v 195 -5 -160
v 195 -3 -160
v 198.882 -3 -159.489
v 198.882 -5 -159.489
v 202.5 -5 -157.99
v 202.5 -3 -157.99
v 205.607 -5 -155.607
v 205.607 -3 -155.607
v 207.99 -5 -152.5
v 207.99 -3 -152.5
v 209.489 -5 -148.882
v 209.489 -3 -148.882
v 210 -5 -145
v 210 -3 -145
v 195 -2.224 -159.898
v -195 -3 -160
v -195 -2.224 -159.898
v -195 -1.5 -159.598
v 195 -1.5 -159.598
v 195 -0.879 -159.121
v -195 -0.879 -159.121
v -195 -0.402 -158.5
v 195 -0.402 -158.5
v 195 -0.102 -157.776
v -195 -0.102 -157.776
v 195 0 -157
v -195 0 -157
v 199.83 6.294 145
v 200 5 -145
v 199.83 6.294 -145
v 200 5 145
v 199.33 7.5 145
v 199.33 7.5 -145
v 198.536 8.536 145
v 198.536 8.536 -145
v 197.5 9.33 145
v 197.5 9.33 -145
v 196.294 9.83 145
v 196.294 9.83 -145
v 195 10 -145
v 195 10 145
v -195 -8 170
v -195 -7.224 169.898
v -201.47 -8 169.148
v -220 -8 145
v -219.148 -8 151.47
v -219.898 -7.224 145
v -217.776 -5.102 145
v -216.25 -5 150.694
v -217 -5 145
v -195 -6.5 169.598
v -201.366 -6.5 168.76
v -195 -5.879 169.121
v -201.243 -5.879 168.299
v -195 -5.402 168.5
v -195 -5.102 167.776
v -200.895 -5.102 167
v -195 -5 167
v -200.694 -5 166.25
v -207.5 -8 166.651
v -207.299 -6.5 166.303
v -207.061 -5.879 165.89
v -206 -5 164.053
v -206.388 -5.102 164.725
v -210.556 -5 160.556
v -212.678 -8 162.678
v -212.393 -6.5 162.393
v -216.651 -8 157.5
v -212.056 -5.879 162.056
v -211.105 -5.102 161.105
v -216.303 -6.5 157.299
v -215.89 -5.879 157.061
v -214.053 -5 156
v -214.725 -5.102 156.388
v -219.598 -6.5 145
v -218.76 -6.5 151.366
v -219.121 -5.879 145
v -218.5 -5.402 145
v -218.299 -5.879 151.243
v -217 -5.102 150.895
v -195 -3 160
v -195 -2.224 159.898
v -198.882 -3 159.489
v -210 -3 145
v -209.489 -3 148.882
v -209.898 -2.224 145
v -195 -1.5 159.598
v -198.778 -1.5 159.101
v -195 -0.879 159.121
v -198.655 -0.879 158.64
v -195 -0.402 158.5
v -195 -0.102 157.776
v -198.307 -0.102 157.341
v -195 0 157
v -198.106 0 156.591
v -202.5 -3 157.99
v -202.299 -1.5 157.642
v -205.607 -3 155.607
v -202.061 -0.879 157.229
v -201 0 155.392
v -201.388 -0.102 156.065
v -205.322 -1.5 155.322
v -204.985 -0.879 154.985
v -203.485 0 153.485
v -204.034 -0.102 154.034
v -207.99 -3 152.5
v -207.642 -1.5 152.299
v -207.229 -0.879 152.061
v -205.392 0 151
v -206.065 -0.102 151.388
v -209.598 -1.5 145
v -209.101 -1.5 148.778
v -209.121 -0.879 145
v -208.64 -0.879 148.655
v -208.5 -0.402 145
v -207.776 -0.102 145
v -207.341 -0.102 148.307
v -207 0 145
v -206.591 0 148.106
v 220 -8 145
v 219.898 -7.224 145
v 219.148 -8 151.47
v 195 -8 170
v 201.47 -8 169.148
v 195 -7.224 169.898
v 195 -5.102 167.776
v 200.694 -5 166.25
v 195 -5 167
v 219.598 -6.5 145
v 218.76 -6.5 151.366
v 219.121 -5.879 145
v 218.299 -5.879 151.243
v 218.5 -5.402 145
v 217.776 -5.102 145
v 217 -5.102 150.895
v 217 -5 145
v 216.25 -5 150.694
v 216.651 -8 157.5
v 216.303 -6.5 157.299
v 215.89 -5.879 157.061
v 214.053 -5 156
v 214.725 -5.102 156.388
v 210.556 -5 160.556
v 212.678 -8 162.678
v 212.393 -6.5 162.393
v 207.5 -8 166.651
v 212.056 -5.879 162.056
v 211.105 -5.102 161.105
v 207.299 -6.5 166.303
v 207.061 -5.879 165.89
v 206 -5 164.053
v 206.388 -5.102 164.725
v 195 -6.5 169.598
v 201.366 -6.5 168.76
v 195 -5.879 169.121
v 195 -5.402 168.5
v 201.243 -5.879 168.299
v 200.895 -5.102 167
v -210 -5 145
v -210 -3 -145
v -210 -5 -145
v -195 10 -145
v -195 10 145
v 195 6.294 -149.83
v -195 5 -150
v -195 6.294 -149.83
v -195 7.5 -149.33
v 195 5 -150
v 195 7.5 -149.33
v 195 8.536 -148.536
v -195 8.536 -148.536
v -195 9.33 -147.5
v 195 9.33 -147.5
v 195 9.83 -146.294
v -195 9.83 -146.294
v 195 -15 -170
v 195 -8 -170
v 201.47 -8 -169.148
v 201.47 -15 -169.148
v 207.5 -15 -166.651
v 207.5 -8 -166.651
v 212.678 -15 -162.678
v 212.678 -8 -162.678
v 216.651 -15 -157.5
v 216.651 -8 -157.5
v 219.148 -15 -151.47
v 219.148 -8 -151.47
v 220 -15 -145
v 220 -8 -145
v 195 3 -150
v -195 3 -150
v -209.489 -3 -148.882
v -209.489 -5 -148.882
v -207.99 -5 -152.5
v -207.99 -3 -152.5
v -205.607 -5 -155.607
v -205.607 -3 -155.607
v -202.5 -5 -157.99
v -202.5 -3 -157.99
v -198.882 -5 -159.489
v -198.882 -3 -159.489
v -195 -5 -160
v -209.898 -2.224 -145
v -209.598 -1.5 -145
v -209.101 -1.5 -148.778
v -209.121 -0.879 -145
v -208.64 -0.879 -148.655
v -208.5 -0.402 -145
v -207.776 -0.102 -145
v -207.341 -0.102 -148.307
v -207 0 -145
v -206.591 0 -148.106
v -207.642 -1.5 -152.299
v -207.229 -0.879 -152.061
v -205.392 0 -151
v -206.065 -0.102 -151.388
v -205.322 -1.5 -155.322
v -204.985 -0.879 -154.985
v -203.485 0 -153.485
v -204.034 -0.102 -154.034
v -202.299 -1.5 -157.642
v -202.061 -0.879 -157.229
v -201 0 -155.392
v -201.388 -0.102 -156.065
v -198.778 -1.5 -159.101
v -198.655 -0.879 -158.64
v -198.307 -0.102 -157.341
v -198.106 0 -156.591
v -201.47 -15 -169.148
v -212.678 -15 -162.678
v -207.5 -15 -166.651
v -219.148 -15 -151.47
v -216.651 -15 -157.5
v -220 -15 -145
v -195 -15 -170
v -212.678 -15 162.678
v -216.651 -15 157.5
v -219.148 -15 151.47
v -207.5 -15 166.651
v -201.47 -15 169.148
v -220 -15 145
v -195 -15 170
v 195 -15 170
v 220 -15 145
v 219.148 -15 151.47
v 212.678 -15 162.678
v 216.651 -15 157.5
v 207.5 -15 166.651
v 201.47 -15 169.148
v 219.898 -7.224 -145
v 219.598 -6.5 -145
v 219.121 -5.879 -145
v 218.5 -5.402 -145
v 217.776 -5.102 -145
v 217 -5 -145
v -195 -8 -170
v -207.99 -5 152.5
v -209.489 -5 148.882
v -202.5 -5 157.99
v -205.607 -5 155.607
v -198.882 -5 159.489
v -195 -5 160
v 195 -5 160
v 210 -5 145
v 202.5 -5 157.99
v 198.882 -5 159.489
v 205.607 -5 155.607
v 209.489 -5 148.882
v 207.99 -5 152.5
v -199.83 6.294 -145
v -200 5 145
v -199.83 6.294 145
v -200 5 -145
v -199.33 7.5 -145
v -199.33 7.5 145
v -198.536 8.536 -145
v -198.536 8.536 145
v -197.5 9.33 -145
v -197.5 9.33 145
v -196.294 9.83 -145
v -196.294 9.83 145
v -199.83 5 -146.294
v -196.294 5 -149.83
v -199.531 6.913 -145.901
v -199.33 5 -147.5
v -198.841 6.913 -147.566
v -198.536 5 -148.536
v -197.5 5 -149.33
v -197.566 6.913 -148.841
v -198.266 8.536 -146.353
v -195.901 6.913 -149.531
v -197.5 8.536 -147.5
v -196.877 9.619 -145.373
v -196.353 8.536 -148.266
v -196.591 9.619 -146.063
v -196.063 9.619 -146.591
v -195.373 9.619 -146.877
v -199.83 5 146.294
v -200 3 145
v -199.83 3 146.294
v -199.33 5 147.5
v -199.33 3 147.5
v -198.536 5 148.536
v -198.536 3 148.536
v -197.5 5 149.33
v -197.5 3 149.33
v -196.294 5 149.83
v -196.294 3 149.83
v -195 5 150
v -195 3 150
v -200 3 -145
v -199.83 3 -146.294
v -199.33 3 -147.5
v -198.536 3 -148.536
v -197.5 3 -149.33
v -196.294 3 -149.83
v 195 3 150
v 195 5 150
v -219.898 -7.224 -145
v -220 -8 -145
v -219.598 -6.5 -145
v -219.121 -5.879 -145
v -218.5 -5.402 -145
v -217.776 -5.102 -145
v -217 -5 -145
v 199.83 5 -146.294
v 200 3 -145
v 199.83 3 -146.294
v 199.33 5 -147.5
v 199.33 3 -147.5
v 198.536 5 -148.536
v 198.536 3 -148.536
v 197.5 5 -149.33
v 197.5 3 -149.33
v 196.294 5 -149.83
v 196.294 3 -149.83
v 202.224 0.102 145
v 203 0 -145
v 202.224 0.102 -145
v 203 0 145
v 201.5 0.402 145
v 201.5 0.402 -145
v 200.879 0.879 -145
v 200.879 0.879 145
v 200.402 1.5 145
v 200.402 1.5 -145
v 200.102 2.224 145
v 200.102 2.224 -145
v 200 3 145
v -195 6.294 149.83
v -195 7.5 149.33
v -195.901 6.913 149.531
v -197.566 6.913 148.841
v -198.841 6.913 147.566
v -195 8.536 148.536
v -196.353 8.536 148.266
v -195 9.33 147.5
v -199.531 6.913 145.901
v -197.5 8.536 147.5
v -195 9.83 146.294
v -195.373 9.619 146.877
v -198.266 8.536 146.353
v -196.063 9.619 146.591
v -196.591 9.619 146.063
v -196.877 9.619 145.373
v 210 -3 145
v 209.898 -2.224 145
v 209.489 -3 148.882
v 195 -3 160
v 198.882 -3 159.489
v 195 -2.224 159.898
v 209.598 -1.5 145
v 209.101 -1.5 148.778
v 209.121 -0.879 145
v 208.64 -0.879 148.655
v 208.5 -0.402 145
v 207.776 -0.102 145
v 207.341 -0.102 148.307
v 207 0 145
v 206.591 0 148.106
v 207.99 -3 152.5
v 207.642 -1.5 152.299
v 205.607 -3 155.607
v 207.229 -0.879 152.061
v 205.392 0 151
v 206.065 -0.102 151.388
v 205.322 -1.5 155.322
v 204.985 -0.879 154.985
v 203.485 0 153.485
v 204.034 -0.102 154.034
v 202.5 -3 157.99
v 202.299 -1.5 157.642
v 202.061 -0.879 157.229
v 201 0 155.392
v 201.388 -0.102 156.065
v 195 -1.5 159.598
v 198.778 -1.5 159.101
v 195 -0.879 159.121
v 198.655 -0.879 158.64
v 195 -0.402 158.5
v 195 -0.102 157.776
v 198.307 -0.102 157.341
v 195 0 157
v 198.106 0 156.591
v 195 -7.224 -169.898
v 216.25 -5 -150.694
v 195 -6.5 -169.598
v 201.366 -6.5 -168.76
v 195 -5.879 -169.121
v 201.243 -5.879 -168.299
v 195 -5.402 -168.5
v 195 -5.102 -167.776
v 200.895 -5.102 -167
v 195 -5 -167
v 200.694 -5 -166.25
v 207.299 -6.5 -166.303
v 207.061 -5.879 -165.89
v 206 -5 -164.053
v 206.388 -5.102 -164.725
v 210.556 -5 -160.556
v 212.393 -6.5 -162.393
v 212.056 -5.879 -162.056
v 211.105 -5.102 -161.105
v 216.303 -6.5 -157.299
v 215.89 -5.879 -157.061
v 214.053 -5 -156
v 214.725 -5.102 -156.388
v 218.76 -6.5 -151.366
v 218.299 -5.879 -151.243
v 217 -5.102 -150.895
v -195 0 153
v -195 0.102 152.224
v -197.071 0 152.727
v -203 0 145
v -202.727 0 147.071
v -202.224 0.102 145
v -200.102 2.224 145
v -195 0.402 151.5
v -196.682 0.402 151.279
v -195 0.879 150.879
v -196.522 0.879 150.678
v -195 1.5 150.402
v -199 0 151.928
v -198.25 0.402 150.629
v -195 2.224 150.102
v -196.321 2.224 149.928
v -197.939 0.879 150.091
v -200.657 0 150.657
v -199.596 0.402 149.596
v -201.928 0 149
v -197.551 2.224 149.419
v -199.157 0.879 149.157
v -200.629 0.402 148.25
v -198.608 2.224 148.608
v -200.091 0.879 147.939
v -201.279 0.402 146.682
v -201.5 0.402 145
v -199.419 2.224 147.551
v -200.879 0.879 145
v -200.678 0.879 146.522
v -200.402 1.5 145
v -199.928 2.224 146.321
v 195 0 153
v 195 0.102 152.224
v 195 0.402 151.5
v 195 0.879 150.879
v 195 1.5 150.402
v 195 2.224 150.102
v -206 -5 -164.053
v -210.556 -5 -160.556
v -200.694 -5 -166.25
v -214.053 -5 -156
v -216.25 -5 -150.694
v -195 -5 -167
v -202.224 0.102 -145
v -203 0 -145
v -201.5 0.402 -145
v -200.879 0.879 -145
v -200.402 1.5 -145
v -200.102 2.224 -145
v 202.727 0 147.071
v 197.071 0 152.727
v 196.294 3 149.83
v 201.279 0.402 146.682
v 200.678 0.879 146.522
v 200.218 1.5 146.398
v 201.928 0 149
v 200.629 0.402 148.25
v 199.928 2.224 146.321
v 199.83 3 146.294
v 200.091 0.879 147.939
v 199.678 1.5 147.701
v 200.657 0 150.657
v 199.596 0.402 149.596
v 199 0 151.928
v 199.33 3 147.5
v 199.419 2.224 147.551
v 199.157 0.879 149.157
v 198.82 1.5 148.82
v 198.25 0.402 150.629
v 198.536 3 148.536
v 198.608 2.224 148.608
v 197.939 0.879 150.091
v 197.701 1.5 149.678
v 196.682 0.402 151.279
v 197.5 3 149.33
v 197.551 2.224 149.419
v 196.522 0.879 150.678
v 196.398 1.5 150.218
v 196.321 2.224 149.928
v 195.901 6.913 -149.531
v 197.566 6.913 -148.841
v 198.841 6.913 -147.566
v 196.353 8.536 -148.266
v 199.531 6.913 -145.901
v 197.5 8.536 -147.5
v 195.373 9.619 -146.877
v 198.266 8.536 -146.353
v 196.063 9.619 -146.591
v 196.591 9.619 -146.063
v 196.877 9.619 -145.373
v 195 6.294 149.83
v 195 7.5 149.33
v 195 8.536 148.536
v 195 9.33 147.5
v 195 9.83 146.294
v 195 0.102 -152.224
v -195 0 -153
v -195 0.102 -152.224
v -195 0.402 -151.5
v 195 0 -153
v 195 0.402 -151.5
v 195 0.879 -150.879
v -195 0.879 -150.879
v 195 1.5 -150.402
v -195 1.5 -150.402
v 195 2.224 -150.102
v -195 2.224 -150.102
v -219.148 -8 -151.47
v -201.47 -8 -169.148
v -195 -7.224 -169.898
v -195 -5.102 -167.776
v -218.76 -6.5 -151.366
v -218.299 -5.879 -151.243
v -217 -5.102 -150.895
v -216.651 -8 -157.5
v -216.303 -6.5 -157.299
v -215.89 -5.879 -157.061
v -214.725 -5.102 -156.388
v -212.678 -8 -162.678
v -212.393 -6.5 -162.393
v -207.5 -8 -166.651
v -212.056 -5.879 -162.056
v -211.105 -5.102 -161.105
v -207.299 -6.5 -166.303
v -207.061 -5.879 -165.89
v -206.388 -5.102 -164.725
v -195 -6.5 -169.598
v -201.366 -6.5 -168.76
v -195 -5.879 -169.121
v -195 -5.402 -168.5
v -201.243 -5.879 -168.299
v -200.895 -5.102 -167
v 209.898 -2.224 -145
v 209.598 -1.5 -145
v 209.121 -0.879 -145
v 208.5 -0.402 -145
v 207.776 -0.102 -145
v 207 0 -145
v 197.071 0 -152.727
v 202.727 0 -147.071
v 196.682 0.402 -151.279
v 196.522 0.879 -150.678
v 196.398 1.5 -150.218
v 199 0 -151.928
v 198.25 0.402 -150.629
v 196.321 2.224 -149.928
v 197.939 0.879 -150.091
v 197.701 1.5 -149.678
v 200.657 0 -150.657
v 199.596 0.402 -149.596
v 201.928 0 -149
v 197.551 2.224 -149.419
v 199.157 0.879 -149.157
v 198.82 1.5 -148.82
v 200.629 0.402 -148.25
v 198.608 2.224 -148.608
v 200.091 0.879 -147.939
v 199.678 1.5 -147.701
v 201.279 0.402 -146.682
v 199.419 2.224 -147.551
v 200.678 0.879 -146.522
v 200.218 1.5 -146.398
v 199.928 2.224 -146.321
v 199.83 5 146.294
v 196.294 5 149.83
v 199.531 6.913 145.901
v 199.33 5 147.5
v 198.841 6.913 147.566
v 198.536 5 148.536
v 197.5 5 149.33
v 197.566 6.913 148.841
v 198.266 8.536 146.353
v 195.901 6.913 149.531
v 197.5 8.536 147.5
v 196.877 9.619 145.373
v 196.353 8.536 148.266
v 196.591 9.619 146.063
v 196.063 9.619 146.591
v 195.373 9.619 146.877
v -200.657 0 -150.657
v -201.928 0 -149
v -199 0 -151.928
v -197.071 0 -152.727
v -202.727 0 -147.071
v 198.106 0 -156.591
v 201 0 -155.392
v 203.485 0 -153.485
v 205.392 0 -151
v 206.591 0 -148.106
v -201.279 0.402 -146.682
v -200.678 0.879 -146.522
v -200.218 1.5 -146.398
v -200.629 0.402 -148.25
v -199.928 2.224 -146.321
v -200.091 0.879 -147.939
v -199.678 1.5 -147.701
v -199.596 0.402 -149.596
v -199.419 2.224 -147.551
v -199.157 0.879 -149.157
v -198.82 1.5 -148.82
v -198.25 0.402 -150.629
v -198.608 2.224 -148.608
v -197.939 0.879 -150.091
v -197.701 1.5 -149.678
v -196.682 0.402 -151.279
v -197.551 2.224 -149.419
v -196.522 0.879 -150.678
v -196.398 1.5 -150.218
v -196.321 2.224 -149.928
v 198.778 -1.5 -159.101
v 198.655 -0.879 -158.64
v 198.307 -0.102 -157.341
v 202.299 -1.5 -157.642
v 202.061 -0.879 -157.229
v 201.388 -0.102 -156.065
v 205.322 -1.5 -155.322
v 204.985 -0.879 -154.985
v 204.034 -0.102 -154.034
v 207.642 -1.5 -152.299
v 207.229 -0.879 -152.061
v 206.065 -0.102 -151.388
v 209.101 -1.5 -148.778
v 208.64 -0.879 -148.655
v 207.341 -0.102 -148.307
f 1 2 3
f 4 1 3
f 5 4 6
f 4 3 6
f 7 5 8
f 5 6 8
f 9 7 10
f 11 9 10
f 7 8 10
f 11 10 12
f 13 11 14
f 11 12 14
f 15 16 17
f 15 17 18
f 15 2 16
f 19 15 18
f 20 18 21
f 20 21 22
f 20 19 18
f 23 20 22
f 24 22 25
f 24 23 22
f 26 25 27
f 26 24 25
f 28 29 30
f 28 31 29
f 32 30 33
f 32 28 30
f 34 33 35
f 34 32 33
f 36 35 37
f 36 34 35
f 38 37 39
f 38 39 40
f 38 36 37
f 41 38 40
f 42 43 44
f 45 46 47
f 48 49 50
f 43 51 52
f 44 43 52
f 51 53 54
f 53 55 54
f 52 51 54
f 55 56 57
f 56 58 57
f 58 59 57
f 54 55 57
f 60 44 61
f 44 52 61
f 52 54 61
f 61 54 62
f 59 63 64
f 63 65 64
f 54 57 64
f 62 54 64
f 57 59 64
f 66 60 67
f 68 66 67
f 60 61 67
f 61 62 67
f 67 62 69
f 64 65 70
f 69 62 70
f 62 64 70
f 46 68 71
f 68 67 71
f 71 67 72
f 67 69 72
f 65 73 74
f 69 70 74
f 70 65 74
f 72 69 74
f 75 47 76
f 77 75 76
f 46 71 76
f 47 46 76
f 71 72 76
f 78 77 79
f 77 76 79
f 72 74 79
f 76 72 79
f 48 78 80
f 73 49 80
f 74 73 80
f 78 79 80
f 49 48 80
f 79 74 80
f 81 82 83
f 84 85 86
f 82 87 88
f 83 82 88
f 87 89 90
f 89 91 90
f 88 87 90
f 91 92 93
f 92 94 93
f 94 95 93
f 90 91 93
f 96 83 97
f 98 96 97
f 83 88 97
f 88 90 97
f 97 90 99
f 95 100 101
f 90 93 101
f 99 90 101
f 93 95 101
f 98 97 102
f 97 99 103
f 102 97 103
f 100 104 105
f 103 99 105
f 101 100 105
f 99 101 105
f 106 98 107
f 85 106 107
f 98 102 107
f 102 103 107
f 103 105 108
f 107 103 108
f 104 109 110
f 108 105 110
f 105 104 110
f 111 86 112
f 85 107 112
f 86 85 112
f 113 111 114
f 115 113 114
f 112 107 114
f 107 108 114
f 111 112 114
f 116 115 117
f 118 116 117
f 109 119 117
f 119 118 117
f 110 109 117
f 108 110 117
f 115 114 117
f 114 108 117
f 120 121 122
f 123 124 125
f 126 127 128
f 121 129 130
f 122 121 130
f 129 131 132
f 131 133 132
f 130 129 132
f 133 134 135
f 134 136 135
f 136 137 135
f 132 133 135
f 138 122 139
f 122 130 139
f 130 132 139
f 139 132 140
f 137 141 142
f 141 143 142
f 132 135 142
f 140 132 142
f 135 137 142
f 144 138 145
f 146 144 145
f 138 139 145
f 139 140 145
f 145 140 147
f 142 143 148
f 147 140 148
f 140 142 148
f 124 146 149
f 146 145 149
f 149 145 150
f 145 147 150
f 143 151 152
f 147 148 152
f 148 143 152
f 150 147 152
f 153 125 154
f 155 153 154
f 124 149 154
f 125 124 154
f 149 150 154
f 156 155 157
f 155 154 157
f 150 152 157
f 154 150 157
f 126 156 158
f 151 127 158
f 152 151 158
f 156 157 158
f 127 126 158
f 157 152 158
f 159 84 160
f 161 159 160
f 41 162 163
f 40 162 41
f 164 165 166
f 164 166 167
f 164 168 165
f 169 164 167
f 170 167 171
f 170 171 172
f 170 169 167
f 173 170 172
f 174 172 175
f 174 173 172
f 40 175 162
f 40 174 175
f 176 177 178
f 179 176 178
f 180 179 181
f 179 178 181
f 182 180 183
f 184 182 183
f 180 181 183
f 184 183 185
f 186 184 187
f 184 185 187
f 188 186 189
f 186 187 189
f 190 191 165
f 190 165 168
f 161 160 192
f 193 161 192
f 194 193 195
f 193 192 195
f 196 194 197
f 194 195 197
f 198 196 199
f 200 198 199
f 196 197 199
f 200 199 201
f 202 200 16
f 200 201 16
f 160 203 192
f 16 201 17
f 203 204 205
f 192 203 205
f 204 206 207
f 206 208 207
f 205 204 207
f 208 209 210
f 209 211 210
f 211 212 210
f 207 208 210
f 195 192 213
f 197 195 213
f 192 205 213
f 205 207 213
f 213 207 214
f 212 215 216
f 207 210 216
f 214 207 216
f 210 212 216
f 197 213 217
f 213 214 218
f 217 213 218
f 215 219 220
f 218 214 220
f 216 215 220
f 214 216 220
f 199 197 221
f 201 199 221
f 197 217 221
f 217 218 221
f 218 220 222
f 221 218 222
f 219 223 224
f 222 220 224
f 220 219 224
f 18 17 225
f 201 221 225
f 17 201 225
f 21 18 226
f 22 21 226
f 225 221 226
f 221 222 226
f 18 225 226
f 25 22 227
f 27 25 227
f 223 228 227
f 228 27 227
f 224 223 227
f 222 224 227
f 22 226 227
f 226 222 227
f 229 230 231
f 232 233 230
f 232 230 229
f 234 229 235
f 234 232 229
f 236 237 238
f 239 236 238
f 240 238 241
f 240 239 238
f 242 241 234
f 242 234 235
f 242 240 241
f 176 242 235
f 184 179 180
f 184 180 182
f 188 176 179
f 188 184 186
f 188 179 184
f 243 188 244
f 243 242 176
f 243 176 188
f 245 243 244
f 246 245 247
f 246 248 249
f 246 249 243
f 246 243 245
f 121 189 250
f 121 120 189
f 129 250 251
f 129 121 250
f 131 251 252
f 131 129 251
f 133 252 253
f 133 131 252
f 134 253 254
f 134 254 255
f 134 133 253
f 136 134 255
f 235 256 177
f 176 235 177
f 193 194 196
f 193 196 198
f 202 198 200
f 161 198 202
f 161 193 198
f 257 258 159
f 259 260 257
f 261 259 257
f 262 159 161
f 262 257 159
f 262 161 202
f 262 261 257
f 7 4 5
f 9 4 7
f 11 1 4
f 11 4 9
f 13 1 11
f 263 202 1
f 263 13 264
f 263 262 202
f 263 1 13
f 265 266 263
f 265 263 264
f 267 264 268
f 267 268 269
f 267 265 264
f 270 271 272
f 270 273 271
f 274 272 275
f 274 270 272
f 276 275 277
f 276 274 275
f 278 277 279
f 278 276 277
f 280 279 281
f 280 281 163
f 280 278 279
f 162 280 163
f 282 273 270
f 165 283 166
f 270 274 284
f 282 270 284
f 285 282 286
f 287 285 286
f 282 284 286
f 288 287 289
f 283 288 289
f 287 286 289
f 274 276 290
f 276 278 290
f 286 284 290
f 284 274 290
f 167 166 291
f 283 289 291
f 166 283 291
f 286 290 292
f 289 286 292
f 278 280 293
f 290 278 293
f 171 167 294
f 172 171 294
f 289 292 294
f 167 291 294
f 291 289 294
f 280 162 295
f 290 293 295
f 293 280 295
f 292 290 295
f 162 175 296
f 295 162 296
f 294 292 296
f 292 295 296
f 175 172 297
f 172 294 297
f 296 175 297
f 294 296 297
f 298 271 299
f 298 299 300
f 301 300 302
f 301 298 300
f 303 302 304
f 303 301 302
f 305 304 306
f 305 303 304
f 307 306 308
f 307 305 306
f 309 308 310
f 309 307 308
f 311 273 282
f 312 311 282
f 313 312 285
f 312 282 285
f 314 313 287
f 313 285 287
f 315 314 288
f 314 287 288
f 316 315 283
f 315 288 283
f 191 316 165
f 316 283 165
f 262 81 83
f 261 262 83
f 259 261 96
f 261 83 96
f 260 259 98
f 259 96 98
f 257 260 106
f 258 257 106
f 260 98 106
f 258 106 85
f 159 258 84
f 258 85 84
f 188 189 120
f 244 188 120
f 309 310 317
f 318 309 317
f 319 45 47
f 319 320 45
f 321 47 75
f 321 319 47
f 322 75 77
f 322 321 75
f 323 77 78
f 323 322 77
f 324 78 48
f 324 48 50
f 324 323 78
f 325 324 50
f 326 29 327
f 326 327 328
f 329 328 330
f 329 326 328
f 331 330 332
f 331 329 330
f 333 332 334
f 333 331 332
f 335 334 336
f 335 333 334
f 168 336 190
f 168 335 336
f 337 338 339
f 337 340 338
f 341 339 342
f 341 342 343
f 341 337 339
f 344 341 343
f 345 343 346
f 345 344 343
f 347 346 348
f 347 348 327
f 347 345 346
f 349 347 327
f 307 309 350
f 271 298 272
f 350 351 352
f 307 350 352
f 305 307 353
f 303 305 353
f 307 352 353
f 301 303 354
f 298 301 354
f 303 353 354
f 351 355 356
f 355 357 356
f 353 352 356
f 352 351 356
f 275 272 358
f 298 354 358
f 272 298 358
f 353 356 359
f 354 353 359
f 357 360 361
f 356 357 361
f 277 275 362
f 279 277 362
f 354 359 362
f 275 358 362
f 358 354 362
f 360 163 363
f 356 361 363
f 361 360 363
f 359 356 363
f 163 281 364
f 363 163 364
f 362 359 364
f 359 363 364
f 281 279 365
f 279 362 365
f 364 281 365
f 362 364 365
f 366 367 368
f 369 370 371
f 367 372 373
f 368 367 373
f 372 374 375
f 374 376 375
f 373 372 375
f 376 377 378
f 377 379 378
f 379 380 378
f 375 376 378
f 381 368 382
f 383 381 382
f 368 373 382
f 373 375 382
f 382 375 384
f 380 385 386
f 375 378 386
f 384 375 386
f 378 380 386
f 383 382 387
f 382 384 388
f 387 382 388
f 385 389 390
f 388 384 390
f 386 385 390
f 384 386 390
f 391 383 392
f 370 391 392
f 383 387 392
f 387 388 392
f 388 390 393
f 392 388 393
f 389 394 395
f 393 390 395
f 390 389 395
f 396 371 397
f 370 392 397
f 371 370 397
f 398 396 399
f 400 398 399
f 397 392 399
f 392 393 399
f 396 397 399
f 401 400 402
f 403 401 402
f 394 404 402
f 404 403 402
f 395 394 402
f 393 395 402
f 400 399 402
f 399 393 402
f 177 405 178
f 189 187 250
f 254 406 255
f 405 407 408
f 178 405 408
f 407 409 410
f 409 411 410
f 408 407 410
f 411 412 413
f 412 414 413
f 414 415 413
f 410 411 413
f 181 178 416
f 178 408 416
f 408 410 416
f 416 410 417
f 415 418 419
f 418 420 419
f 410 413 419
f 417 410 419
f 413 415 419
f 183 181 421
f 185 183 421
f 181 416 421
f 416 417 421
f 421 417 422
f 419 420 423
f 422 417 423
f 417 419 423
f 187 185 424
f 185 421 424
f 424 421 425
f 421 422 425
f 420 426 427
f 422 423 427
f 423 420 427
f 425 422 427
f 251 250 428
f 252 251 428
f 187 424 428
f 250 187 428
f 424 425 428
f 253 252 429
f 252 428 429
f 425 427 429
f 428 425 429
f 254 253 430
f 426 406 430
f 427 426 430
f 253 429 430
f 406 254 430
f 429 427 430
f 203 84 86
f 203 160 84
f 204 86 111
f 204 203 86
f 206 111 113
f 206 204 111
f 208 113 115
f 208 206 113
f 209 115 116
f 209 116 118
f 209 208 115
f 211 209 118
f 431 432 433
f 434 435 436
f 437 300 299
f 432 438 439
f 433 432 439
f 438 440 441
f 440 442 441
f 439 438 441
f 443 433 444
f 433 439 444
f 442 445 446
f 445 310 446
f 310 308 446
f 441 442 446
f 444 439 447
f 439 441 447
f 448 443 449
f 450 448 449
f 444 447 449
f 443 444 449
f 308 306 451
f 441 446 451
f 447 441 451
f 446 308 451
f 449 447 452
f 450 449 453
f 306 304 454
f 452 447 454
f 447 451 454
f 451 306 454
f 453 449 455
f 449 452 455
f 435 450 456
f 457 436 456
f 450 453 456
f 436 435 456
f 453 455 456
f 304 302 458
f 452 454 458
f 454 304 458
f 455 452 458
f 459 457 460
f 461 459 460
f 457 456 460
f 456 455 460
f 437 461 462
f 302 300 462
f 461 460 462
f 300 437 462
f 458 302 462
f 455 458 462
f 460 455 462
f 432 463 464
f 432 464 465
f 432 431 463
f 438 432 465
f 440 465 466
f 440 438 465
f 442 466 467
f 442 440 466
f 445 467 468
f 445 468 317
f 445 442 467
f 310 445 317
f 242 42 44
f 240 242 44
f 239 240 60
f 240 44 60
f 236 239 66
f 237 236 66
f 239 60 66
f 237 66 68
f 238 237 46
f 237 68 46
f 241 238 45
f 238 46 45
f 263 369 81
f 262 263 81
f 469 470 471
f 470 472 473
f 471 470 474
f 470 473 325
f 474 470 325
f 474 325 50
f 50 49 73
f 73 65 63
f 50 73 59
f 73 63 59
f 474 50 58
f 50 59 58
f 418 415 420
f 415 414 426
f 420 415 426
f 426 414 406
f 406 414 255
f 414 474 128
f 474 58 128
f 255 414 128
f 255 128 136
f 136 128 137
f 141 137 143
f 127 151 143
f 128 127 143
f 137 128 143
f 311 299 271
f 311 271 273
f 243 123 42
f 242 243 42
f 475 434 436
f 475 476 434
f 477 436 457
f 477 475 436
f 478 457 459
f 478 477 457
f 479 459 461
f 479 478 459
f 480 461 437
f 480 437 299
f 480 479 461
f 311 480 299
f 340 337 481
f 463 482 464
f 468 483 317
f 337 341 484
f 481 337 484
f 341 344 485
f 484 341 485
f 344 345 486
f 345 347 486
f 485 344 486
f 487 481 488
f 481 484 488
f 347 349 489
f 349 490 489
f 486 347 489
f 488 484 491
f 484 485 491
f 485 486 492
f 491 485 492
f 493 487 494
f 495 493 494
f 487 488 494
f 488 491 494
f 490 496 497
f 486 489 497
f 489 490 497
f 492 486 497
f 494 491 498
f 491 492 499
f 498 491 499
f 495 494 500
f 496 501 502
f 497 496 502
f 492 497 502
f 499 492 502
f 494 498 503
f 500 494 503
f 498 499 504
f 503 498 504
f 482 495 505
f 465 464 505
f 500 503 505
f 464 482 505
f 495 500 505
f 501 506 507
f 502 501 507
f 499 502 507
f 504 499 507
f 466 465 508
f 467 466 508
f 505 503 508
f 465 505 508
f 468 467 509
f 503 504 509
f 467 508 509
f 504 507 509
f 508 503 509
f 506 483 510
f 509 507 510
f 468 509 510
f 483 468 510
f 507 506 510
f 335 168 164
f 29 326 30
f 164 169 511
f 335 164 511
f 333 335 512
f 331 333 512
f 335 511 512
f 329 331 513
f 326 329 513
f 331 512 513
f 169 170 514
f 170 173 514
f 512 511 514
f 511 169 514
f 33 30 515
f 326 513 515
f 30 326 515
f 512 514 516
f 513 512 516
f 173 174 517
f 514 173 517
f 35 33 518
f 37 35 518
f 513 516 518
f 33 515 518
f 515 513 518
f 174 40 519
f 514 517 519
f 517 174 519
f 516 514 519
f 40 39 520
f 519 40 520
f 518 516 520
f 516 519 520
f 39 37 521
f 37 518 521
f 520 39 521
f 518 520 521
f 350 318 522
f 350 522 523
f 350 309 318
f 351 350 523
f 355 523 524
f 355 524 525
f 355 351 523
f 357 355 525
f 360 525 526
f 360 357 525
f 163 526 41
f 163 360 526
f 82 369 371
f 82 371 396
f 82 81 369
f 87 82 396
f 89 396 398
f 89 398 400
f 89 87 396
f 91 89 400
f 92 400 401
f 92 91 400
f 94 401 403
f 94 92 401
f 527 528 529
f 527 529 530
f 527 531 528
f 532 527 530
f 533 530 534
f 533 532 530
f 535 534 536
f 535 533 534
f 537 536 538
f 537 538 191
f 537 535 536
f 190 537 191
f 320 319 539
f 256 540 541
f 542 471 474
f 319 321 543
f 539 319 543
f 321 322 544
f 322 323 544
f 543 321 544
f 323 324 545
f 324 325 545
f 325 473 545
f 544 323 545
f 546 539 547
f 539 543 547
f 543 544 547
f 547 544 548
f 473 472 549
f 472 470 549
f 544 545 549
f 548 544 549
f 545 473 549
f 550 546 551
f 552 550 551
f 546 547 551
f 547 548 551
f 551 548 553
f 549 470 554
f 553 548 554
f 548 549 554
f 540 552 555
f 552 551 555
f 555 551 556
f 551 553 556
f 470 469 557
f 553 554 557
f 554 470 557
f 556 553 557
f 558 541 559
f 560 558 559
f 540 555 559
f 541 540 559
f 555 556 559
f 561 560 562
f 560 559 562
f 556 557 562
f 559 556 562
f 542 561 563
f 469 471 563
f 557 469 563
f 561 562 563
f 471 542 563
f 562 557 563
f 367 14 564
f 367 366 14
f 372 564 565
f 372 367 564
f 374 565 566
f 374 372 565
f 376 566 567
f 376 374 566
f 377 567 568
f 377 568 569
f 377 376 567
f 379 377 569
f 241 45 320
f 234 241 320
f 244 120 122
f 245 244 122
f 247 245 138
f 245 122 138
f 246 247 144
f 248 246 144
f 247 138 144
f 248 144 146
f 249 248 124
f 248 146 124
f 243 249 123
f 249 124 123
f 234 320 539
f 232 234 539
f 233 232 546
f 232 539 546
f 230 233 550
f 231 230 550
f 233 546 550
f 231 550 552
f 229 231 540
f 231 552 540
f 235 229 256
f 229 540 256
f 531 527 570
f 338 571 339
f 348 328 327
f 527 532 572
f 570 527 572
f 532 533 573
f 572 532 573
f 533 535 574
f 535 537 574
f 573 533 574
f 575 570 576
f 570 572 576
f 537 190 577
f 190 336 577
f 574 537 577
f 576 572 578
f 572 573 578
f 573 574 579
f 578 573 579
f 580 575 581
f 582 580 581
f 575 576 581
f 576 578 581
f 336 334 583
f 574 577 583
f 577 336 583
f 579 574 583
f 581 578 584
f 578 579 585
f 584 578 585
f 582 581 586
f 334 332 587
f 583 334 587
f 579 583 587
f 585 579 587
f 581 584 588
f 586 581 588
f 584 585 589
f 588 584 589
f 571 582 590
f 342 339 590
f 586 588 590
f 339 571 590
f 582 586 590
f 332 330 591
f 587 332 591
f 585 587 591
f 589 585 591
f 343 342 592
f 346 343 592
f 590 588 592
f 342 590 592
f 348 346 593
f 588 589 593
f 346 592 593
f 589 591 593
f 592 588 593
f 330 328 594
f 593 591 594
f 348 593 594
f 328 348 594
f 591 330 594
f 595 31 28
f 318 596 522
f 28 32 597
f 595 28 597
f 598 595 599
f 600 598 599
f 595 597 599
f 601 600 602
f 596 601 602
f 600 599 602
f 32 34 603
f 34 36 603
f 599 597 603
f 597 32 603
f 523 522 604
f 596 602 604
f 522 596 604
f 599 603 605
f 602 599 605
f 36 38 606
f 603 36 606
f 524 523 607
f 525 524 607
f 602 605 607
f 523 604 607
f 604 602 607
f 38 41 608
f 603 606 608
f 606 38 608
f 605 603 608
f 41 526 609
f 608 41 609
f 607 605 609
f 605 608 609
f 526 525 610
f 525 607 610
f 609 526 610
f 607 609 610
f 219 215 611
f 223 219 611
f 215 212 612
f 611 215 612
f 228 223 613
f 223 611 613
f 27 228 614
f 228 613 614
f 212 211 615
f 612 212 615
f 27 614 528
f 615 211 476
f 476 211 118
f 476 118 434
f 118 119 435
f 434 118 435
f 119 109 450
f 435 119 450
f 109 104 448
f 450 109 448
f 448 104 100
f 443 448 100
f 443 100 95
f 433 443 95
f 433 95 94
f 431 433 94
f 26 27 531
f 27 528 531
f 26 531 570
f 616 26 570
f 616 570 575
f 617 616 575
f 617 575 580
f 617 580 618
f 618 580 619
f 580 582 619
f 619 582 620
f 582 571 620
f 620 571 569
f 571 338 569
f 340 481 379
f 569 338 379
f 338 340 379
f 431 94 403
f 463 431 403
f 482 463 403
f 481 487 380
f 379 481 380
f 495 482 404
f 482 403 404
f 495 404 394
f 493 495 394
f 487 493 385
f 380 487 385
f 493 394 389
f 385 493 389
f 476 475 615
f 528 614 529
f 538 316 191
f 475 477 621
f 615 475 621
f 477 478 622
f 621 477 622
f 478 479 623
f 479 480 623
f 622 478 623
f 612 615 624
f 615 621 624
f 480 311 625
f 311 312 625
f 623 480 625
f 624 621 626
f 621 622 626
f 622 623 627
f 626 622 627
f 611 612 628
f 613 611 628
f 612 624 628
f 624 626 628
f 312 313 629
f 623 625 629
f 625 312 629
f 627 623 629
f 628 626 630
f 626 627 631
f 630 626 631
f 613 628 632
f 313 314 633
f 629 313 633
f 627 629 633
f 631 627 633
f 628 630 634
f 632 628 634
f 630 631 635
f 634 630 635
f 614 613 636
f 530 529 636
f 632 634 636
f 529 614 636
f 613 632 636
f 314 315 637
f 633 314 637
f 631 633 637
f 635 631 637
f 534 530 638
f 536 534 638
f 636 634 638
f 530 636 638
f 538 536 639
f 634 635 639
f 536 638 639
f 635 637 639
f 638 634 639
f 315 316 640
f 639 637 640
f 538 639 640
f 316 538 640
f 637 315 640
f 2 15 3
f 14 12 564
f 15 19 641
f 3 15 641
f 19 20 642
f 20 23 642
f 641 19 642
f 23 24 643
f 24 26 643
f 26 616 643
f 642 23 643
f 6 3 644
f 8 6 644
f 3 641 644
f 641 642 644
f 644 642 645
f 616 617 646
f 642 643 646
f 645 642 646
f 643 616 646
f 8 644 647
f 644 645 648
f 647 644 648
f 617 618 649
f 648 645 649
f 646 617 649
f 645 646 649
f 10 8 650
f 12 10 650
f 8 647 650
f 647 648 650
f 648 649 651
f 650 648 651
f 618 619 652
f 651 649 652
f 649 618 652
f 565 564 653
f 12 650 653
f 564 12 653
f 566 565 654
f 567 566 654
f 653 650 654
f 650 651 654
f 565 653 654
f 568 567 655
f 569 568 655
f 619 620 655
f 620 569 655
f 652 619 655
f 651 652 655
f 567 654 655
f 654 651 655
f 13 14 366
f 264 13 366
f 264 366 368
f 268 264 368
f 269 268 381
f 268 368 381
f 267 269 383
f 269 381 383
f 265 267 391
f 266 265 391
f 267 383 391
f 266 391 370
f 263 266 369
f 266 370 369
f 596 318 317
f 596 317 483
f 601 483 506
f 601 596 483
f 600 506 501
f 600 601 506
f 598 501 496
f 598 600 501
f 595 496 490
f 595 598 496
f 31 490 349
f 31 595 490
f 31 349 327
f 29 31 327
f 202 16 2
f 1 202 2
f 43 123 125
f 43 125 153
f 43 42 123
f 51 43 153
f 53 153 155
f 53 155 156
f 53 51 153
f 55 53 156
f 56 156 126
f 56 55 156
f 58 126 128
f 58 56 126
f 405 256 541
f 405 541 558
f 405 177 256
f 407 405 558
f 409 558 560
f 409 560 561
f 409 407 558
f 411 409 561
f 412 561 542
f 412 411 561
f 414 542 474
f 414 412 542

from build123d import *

# Parameters (mm, degrees)
SKETCH1_W           = 400
SKETCH1_H           = 300
BOSS_EXTRUDE1_DEPTH = 10
FILLET1_R           = 5
FILLET2_R           = 5
BOSS_EXTRUDE2_DEPTH = 5
BOSS_EXTRUDE5_DEPTH = 10
FILLET3_R           = 3
FILLET4_R           = 3


with BuildPart() as part:
    # Sketch1 → Boss-Extrude1 (new body)
    with BuildSketch(Plane(origin=(0, 0, 0), x_dir=(1, 0, 0), z_dir=(0, 1, 0))):
        Rectangle(SKETCH1_W, SKETCH1_H)
    extrude(amount=BOSS_EXTRUDE1_DEPTH)

    # Fillet1
    fillet1_edges = [part.edges().sort_by_distance(p)[0] for p in [
        (-200, 5, -150),
        (200, 5, -150),
        (200, 5, 150),
        (-200, 5, 150),
    ]]
    fillet(fillet1_edges, radius=FILLET1_R)

    # Fillet2
    fillet2_edges = [part.edges().sort_by_distance(p)[0] for p in [
        (-200, 10, 0),
        (0, 10, -150),
        (0, 10, 150),
        (200, 10, 0),
        (198.535533906, 10, 148.535533906),
        (198.535533906, 10, -148.535533906),
        (-198.535533906, 10, 148.535533906),
        (-198.535533906, 10, -148.535533906),
    ]]
    fillet(fillet2_edges, radius=FILLET2_R)

    # Sketch2 → Boss-Extrude2 (add)
    with BuildSketch(Plane.XZ):
        with BuildLine():
            Line((195, 160), (-195, 160))
            ThreePointArc((-195, 160), (-205.606601718, 155.606601718), (-210, 145))
            Line((-210, 145), (-210, -145))
            ThreePointArc((-210, -145), (-205.606601718, -155.606601718), (-195, -160))
            Line((-195, -160), (195, -160))
            ThreePointArc((195, -160), (205.606601718, -155.606601718), (210, -145))
            Line((210, -145), (210, 145))
            ThreePointArc((210, 145), (205.606601718, 155.606601718), (195, 160))
        make_face()
    extrude(amount=BOSS_EXTRUDE2_DEPTH)

    # Fillet3
    fillet3_edges = [part.edges().sort_by_distance(p)[0] for p in [
        (-200, 0, 0),
        (0, 0, -150),
        (200, 0, 0),
        (0, 0, 150),
        (198.535533906, 0, 148.535533906),
        (198.535533906, 0, -148.535533906),
        (-198.535533906, 0, 148.535533906),
        (-198.535533906, 0, -148.535533906),
        (205.606601718, 0, 155.606601718),
        (0, 0, 160),
        (-205.606601718, 0, 155.606601718),
        (-210, 0, 0),
        (-205.606601718, 0, -155.606601718),
        (0, 0, -160),
        (205.606601718, 0, -155.606601718),
        (210, 0, 0),
    ]]
    fillet(fillet3_edges, radius=FILLET3_R)


with BuildPart() as body_2:
    # Sketch3 → Boss-Extrude5 (new body)
    with BuildSketch(Plane.XZ.offset(5)):
        with BuildLine():
            Line((195, 170), (-195, 170))
            ThreePointArc((-195, 170), (-212.67766953, 162.67766953), (-220, 145))
            Line((-220, 145), (-220, -145))
            ThreePointArc((-220, -145), (-212.67766953, -162.67766953), (-195, -170))
            Line((-195, -170), (195, -170))
            ThreePointArc((195, -170), (212.67766953, -162.67766953), (220, -145))
            Line((220, -145), (220, 145))
            ThreePointArc((220, 145), (212.67766953, 162.67766953), (195, 170))
        make_face()
    extrude(amount=BOSS_EXTRUDE5_DEPTH)

    # Fillet4
    fillet4_edges = [body_2.edges().sort_by_distance(p)[0] for p in [
        (0, -5, -170),
        (-212.67766953, -5, -162.67766953),
        (-220, -5, 0),
        (-212.67766953, -5, 162.67766953),
        (0, -5, 170),
        (212.67766953, -5, 162.67766953),
        (220, -5, 0),
        (212.67766953, -5, -162.67766953),
    ]]
    fillet(fillet4_edges, radius=FILLET4_R)


solid = Compound([part.part, body_2.part])
